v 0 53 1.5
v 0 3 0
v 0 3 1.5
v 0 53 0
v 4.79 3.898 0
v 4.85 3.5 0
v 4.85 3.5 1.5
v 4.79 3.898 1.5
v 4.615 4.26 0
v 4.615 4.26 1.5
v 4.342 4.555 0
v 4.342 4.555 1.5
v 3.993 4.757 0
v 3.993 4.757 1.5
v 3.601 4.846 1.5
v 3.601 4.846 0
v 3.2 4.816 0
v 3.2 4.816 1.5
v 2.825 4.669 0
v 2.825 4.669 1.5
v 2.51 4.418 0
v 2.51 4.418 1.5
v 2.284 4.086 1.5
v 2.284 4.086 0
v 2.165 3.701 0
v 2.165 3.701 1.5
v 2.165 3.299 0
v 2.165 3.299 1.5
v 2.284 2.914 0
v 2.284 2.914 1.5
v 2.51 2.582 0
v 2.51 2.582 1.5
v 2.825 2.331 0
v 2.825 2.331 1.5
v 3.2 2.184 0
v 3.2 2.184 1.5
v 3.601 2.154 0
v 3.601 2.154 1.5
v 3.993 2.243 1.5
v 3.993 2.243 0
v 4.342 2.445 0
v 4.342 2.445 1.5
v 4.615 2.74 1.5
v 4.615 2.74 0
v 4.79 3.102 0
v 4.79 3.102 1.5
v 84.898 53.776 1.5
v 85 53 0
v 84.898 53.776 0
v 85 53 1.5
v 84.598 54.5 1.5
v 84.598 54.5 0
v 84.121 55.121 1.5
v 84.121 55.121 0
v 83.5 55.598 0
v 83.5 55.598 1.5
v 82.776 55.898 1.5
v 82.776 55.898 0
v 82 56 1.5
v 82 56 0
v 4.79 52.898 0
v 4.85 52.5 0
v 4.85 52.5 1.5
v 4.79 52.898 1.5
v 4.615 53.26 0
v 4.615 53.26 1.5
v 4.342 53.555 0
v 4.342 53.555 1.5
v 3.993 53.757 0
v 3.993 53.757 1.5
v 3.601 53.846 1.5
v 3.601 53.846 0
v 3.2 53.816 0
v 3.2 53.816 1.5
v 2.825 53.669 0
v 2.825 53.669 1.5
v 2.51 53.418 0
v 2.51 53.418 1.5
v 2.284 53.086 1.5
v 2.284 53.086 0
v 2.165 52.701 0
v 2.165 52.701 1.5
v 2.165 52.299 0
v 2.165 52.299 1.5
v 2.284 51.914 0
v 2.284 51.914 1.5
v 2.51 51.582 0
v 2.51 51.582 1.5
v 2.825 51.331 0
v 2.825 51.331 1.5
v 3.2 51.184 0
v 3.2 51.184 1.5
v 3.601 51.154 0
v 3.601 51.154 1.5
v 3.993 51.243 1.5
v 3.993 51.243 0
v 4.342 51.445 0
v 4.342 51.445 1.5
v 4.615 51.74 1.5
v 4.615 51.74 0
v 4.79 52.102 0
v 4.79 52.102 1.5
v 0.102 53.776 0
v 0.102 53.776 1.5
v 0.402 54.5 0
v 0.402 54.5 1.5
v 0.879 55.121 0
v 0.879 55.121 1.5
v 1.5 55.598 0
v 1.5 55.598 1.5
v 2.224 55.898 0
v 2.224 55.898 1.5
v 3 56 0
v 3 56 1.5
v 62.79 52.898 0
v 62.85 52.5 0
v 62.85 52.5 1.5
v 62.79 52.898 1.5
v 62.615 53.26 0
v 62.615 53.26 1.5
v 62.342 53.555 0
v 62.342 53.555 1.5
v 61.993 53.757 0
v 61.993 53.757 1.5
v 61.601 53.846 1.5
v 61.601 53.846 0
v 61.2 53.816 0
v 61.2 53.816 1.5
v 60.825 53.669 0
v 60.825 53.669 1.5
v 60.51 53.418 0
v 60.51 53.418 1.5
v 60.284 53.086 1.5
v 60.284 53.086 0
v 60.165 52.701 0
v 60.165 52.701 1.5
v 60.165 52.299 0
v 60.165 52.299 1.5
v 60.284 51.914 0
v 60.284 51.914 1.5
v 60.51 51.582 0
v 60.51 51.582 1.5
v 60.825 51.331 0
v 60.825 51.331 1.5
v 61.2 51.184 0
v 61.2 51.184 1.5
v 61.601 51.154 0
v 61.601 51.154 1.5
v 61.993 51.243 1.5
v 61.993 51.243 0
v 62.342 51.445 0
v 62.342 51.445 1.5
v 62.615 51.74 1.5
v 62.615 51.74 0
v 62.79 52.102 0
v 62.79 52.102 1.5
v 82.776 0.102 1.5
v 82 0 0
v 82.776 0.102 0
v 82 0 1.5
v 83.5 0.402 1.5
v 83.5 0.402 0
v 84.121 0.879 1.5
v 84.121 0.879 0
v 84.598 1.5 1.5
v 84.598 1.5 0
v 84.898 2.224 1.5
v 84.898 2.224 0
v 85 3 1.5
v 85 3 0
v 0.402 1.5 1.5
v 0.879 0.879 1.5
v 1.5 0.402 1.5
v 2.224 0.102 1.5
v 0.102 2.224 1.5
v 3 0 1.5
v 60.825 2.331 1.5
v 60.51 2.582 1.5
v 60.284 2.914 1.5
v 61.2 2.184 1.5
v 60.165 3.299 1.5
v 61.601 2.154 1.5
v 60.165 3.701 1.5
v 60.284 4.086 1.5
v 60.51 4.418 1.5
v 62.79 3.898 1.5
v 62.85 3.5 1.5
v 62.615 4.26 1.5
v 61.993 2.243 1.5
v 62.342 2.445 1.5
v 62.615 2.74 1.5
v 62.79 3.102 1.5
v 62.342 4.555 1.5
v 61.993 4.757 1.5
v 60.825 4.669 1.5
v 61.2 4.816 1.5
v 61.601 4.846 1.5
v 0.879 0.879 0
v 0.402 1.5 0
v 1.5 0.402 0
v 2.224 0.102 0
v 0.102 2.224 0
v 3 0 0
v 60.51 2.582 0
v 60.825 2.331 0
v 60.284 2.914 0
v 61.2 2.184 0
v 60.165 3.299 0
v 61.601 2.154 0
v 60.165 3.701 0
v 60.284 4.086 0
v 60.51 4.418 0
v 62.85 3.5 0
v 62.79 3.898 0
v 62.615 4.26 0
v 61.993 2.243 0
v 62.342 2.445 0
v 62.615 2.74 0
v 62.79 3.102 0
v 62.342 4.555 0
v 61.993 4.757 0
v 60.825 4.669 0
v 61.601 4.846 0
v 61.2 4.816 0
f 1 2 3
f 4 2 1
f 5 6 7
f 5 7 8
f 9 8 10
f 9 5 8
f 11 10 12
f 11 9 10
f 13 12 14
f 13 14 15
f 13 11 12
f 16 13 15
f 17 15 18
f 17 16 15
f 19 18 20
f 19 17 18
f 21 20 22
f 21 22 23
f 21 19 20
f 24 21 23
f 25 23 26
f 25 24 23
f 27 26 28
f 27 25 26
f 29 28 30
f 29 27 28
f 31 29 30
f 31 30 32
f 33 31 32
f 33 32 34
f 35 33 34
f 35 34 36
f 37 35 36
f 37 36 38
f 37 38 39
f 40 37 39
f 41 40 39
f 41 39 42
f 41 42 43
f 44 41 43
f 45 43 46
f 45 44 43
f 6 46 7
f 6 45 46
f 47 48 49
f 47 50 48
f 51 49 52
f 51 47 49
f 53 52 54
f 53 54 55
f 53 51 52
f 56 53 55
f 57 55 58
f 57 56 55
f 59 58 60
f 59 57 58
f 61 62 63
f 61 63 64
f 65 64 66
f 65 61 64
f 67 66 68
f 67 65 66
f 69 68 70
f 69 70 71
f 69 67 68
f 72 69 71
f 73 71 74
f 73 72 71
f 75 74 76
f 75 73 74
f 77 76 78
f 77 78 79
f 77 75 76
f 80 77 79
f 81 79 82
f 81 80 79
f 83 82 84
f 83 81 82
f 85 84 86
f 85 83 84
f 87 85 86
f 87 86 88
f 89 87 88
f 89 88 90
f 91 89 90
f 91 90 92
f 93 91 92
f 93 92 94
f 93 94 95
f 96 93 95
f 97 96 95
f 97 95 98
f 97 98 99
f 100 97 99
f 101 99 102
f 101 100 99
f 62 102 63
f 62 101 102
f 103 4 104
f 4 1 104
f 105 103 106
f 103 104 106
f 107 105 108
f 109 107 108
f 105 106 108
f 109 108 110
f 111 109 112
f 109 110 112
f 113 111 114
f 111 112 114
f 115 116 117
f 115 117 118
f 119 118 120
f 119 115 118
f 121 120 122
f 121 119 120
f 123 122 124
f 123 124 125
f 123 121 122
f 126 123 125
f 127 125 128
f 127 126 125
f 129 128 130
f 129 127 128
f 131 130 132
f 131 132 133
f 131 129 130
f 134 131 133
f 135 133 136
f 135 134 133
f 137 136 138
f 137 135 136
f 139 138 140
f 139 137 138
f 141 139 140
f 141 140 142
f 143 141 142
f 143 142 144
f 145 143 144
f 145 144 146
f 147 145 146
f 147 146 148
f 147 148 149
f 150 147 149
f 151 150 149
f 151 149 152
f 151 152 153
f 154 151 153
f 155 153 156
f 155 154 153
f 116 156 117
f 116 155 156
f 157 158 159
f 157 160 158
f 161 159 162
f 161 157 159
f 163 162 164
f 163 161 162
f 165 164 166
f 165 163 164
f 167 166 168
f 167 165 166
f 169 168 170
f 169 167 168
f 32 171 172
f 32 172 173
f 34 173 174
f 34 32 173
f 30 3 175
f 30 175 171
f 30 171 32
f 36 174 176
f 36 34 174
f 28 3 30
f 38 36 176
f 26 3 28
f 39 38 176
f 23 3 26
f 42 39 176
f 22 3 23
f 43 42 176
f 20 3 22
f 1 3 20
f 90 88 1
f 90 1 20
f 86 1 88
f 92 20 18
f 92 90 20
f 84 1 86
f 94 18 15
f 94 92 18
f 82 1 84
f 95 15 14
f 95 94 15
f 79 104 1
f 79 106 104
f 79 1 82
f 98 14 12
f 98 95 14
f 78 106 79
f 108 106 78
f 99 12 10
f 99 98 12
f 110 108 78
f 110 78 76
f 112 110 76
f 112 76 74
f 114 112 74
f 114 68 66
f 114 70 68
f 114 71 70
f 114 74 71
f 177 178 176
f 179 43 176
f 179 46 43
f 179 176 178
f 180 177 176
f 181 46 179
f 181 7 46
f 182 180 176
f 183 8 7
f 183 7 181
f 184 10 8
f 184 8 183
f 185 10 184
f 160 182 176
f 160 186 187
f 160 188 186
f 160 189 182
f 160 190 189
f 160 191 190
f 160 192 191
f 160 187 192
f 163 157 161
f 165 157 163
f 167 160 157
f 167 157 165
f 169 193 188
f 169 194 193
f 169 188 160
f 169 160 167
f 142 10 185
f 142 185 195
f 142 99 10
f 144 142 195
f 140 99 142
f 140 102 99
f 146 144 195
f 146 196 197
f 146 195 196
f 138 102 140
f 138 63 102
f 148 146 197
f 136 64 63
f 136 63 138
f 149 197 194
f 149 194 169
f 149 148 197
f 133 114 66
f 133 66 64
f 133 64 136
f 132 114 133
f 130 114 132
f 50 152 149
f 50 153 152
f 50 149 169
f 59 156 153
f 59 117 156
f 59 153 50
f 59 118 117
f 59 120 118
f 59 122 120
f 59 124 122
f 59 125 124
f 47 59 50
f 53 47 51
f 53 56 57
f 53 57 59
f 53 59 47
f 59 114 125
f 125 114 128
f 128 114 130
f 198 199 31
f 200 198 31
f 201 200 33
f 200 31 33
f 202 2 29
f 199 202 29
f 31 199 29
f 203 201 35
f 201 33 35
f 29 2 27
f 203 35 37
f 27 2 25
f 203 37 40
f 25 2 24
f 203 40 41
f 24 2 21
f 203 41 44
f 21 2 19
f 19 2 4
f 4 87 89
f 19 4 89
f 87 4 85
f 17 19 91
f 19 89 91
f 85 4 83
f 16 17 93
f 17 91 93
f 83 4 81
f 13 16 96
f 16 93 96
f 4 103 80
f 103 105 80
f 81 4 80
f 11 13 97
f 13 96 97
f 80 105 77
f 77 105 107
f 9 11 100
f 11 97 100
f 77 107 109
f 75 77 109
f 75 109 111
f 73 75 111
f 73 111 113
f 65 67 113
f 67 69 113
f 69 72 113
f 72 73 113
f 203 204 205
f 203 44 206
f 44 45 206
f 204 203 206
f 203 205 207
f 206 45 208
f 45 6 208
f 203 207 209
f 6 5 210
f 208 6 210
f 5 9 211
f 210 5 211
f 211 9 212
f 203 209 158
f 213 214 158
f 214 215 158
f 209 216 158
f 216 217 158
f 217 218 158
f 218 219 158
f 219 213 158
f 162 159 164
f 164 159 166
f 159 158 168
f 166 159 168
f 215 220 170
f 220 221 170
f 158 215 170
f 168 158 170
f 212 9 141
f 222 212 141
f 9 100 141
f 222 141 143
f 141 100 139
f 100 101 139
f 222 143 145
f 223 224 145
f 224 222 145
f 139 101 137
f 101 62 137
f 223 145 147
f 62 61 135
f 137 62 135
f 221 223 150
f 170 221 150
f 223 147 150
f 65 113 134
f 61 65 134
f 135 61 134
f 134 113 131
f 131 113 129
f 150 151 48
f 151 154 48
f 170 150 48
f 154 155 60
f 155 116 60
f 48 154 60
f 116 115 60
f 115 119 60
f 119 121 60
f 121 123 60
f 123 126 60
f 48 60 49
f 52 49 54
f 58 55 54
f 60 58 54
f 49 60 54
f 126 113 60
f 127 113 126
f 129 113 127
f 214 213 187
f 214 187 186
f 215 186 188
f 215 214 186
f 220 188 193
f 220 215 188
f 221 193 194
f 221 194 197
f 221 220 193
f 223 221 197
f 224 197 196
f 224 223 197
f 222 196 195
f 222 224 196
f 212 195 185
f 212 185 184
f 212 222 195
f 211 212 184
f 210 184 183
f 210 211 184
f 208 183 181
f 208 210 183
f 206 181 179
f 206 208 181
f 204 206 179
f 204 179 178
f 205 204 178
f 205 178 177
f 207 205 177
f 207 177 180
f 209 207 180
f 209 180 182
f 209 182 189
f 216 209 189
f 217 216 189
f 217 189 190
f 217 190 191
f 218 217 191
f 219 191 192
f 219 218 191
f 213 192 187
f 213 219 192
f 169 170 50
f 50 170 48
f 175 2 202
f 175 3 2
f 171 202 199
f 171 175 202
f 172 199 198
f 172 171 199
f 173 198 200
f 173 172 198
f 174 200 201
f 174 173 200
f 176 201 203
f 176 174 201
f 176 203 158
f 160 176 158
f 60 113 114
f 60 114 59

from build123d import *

# Parameters (mm, degrees)
CYLINDER_R     = 1.35
CYLINDER_DEPTH = 1.5
ARRAY_X_COUNT  = 2
ARRAY_X_PITCH  = 58
ARRAY_Y_COUNT  = 2
ARRAY_Y_PITCH  = 49
BOX_W          = 85
BOX_H          = 56
BOX_DEPTH      = 1.5
FILLET006_R    = 3


with BuildPart() as mounting_holes:
    # Cylinder → Cylinder (new body)
    with BuildSketch(Plane(origin=(3.5, 3.5, 0), x_dir=(1, 0, 0), z_dir=(0, 0, 1))):
        Circle(CYLINDER_R)
    extrude(amount=CYLINDER_DEPTH)

    # Array X: Mounting Holes ×2


with BuildPart() as mounting_holes_1:
    add(mounting_holes.part)
    with Locations(*[(i * ARRAY_X_PITCH, 0, 0) for i in range(1, ARRAY_X_COUNT)]):
        add(mounting_holes.part)

    # Array Y: Mounting Holes ×2


with BuildPart() as mounting_holes_2:
    add(mounting_holes_1.part)
    with Locations(*[(0, i * ARRAY_Y_PITCH, 0) for i in range(1, ARRAY_Y_COUNT)]):
        add(mounting_holes_1.part)


with BuildPart() as pcb:
    # Box → Box (new body)
    with BuildSketch(Plane.XY):
        with Locations((42.5, 28)):
            Rectangle(BOX_W, BOX_H)
    extrude(amount=BOX_DEPTH)

    # Fillet006
    fillet006_edges = [pcb.edges().sort_by_distance(p)[0] for p in [
        (0, 0, 0.75),
        (0, 56, 0.75),
        (85, 0, 0.75),
        (85, 56, 0.75),
    ]]
    fillet(fillet006_edges, radius=FILLET006_R)

    # Cut: cut Mounting Holes
    add(mounting_holes_2.part, mode=Mode.SUBTRACT)


solid = pcb.part
